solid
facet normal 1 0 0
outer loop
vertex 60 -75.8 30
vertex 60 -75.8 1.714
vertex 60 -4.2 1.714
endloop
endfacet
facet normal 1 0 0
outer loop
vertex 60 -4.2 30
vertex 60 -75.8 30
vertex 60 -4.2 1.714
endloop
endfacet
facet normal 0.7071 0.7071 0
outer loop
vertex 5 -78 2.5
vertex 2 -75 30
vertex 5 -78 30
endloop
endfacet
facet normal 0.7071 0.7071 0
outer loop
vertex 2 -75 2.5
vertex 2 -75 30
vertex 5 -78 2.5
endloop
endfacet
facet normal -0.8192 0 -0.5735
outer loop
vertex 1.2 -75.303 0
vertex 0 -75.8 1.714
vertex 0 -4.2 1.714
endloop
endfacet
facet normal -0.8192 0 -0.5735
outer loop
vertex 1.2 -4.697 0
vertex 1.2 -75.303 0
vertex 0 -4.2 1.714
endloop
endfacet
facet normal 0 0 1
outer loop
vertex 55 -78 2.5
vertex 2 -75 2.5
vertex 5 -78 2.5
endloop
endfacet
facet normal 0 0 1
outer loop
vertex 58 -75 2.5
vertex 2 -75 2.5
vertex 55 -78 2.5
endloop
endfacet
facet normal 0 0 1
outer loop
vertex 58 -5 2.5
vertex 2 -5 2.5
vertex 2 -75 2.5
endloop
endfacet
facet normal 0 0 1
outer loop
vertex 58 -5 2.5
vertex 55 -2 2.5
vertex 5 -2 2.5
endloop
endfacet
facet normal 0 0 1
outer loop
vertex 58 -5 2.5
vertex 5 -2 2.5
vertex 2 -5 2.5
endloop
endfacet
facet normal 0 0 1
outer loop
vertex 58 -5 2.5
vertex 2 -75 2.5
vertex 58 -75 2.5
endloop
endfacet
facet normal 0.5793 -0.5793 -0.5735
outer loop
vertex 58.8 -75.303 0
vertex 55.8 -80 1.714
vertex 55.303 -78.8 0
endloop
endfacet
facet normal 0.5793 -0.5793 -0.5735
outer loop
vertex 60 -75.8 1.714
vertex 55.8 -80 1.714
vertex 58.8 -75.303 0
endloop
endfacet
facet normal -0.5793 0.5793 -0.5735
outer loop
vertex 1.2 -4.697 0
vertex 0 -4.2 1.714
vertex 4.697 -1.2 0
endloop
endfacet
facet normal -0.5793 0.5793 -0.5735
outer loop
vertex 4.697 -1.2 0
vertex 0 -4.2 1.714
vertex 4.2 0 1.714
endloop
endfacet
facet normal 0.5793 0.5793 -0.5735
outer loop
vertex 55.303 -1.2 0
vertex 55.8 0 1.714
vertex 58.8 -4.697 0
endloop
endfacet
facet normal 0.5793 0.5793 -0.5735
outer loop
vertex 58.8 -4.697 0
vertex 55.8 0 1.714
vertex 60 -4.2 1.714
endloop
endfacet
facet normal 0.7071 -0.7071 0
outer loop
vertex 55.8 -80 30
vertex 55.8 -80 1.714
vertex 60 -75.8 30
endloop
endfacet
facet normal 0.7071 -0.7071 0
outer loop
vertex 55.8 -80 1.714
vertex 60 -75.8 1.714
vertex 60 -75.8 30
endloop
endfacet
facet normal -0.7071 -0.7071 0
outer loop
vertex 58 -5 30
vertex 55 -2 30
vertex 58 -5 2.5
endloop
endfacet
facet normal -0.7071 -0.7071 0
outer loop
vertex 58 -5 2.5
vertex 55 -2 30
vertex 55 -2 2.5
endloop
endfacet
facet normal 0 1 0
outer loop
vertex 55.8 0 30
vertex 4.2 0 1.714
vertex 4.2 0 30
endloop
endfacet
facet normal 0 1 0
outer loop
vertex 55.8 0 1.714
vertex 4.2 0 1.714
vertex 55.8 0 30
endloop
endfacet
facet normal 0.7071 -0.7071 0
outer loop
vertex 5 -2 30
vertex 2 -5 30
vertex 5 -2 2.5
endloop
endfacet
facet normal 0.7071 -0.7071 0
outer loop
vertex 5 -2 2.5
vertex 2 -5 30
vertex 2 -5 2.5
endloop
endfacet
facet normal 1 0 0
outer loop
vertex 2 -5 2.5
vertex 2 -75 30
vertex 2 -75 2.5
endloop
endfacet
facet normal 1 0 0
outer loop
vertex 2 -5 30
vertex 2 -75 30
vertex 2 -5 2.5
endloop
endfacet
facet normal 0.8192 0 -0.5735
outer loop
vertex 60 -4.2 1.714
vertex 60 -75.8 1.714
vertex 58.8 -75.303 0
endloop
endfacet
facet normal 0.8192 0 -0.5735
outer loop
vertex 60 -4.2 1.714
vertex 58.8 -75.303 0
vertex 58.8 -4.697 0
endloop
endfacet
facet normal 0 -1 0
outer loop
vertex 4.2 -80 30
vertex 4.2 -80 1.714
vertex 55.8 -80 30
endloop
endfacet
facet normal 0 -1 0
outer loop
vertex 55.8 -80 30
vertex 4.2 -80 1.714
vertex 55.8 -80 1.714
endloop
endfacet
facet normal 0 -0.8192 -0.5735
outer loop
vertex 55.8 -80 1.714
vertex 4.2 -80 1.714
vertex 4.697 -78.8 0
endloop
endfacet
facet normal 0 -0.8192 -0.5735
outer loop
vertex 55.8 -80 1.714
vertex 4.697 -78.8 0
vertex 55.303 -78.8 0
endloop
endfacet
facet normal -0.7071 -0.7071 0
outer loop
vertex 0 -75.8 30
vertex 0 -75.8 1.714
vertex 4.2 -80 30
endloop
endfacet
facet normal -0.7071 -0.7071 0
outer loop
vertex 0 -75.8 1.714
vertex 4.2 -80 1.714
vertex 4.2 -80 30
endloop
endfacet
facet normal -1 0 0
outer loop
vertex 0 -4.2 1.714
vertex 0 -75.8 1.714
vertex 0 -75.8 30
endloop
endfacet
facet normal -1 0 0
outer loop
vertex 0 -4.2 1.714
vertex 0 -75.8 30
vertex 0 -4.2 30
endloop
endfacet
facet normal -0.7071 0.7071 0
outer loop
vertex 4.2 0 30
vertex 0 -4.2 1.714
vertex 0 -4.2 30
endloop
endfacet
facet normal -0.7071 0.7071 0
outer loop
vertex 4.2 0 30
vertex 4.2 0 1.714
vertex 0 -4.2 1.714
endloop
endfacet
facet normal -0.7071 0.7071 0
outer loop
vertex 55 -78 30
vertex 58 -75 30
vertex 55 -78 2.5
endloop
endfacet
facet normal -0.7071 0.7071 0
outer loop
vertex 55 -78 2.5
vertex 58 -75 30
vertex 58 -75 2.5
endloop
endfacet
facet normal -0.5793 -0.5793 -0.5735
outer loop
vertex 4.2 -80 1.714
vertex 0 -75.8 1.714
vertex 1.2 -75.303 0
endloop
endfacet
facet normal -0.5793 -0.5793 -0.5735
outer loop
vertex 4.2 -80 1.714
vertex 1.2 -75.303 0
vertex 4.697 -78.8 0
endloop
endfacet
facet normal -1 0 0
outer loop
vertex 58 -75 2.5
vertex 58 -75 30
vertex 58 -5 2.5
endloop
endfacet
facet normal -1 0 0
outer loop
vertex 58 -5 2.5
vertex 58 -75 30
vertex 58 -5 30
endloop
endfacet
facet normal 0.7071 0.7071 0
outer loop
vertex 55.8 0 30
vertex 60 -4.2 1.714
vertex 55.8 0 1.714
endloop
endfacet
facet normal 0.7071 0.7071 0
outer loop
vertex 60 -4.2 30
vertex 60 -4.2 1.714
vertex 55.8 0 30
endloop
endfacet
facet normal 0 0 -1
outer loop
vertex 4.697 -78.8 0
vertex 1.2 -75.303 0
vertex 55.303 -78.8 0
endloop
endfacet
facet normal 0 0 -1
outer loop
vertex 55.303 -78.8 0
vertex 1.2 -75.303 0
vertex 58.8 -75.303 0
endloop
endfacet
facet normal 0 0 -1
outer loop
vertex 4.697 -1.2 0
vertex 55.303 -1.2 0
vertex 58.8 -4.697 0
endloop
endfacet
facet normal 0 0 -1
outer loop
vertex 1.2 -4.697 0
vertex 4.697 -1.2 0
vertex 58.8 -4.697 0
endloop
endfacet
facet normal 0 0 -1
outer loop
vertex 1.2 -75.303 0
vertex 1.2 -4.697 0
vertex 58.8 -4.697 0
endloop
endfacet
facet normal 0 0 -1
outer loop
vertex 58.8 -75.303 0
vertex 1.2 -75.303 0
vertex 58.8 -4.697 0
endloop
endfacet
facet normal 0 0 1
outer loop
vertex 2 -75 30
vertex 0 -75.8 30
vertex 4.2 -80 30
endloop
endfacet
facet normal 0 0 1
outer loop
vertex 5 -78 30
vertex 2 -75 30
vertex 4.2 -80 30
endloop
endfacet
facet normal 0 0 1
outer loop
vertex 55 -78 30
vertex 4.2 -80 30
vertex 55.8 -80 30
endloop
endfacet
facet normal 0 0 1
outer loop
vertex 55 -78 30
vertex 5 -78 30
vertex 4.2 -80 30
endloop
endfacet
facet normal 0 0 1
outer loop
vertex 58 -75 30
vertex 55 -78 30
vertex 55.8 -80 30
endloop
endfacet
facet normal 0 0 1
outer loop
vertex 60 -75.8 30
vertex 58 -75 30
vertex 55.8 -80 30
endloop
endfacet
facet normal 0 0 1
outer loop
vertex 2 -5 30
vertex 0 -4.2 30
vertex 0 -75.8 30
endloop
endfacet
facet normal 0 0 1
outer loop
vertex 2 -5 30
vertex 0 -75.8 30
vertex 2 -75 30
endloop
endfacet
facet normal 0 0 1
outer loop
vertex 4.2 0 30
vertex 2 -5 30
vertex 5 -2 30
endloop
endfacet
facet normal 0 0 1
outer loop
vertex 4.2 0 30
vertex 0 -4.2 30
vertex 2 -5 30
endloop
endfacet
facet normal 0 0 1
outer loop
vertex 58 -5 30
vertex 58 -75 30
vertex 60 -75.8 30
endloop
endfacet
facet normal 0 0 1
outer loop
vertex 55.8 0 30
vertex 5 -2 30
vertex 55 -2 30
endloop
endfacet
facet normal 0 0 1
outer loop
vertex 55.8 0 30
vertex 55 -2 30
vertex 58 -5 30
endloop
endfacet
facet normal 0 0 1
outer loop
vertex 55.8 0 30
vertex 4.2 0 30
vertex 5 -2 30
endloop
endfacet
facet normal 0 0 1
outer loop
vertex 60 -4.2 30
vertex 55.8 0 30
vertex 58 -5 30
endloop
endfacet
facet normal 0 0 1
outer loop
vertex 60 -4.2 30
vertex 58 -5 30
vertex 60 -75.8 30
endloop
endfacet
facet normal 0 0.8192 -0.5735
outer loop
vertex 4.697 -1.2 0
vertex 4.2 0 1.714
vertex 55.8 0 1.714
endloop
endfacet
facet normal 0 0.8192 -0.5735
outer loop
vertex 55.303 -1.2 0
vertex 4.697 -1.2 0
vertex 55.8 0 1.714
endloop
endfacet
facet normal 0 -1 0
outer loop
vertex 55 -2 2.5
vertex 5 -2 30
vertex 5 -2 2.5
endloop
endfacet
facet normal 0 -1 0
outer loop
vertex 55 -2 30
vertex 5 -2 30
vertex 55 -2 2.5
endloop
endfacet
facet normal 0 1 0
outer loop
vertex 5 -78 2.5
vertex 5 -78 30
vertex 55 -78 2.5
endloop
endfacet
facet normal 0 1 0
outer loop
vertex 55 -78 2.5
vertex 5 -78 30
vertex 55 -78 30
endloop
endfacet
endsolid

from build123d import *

# Parameters (mm, degrees)
F0_W     = 60
F0_H     = 80
F1_DEPTH = 30
F2_W     = 56
F2_H     = 76
F3_DEPTH = 27.5
F4_SIZE  = 3
F5_SIZE  = 4.2
F6_SIZE2 = 1.7137776081
F6_SIZE  = 1.2


with BuildPart() as f1:
    # F0 (on Top) → F1 (new body)
    with BuildSketch(Plane.XY):
        with Locations((30, -40)):
            Rectangle(F0_W, F0_H)
    extrude(amount=F1_DEPTH)

    # F2 (on face) → F3 (cut, through all)
    with BuildSketch(Plane.XY.offset(30)):
        with Locations((30, -40)):
            Rectangle(F2_W, F2_H)
    extrude(amount=-F3_DEPTH, mode=Mode.SUBTRACT)

    # F4
    f4_edges = [f1.edges().sort_by_distance(p)[0] for p in [
        (58, -2, 16.25),
        (2, -2, 16.25),
        (58, -78, 16.25),
        (2, -78, 16.25),
    ]]
    chamfer(f4_edges, length=F4_SIZE)

    # F5
    f5_edges = [f1.edges().sort_by_distance(p)[0] for p in [
        (0, 0, 15),
        (60, 0, 15),
        (60, -80, 15),
        (0, -80, 15),
    ]]
    chamfer(f5_edges, length=F5_SIZE)

    # F6
    f6_edges = [f1.edges().sort_by_distance(p)[0] for p in [
        (30, 0, 0),
        (57.9, -2.1, 0),
        (2.1, -2.1, 0),
        (60, -40, 0),
        (0, -40, 0),
        (57.9, -77.9, 0),
        (2.1, -77.9, 0),
        (30, -80, 0),
    ]]
    f6_side = f1.faces().sort_by_distance((30, -40, 0))[0]
    chamfer(f6_edges, length=F6_SIZE, length2=F6_SIZE2, reference=f6_side)


solid = f1.part
